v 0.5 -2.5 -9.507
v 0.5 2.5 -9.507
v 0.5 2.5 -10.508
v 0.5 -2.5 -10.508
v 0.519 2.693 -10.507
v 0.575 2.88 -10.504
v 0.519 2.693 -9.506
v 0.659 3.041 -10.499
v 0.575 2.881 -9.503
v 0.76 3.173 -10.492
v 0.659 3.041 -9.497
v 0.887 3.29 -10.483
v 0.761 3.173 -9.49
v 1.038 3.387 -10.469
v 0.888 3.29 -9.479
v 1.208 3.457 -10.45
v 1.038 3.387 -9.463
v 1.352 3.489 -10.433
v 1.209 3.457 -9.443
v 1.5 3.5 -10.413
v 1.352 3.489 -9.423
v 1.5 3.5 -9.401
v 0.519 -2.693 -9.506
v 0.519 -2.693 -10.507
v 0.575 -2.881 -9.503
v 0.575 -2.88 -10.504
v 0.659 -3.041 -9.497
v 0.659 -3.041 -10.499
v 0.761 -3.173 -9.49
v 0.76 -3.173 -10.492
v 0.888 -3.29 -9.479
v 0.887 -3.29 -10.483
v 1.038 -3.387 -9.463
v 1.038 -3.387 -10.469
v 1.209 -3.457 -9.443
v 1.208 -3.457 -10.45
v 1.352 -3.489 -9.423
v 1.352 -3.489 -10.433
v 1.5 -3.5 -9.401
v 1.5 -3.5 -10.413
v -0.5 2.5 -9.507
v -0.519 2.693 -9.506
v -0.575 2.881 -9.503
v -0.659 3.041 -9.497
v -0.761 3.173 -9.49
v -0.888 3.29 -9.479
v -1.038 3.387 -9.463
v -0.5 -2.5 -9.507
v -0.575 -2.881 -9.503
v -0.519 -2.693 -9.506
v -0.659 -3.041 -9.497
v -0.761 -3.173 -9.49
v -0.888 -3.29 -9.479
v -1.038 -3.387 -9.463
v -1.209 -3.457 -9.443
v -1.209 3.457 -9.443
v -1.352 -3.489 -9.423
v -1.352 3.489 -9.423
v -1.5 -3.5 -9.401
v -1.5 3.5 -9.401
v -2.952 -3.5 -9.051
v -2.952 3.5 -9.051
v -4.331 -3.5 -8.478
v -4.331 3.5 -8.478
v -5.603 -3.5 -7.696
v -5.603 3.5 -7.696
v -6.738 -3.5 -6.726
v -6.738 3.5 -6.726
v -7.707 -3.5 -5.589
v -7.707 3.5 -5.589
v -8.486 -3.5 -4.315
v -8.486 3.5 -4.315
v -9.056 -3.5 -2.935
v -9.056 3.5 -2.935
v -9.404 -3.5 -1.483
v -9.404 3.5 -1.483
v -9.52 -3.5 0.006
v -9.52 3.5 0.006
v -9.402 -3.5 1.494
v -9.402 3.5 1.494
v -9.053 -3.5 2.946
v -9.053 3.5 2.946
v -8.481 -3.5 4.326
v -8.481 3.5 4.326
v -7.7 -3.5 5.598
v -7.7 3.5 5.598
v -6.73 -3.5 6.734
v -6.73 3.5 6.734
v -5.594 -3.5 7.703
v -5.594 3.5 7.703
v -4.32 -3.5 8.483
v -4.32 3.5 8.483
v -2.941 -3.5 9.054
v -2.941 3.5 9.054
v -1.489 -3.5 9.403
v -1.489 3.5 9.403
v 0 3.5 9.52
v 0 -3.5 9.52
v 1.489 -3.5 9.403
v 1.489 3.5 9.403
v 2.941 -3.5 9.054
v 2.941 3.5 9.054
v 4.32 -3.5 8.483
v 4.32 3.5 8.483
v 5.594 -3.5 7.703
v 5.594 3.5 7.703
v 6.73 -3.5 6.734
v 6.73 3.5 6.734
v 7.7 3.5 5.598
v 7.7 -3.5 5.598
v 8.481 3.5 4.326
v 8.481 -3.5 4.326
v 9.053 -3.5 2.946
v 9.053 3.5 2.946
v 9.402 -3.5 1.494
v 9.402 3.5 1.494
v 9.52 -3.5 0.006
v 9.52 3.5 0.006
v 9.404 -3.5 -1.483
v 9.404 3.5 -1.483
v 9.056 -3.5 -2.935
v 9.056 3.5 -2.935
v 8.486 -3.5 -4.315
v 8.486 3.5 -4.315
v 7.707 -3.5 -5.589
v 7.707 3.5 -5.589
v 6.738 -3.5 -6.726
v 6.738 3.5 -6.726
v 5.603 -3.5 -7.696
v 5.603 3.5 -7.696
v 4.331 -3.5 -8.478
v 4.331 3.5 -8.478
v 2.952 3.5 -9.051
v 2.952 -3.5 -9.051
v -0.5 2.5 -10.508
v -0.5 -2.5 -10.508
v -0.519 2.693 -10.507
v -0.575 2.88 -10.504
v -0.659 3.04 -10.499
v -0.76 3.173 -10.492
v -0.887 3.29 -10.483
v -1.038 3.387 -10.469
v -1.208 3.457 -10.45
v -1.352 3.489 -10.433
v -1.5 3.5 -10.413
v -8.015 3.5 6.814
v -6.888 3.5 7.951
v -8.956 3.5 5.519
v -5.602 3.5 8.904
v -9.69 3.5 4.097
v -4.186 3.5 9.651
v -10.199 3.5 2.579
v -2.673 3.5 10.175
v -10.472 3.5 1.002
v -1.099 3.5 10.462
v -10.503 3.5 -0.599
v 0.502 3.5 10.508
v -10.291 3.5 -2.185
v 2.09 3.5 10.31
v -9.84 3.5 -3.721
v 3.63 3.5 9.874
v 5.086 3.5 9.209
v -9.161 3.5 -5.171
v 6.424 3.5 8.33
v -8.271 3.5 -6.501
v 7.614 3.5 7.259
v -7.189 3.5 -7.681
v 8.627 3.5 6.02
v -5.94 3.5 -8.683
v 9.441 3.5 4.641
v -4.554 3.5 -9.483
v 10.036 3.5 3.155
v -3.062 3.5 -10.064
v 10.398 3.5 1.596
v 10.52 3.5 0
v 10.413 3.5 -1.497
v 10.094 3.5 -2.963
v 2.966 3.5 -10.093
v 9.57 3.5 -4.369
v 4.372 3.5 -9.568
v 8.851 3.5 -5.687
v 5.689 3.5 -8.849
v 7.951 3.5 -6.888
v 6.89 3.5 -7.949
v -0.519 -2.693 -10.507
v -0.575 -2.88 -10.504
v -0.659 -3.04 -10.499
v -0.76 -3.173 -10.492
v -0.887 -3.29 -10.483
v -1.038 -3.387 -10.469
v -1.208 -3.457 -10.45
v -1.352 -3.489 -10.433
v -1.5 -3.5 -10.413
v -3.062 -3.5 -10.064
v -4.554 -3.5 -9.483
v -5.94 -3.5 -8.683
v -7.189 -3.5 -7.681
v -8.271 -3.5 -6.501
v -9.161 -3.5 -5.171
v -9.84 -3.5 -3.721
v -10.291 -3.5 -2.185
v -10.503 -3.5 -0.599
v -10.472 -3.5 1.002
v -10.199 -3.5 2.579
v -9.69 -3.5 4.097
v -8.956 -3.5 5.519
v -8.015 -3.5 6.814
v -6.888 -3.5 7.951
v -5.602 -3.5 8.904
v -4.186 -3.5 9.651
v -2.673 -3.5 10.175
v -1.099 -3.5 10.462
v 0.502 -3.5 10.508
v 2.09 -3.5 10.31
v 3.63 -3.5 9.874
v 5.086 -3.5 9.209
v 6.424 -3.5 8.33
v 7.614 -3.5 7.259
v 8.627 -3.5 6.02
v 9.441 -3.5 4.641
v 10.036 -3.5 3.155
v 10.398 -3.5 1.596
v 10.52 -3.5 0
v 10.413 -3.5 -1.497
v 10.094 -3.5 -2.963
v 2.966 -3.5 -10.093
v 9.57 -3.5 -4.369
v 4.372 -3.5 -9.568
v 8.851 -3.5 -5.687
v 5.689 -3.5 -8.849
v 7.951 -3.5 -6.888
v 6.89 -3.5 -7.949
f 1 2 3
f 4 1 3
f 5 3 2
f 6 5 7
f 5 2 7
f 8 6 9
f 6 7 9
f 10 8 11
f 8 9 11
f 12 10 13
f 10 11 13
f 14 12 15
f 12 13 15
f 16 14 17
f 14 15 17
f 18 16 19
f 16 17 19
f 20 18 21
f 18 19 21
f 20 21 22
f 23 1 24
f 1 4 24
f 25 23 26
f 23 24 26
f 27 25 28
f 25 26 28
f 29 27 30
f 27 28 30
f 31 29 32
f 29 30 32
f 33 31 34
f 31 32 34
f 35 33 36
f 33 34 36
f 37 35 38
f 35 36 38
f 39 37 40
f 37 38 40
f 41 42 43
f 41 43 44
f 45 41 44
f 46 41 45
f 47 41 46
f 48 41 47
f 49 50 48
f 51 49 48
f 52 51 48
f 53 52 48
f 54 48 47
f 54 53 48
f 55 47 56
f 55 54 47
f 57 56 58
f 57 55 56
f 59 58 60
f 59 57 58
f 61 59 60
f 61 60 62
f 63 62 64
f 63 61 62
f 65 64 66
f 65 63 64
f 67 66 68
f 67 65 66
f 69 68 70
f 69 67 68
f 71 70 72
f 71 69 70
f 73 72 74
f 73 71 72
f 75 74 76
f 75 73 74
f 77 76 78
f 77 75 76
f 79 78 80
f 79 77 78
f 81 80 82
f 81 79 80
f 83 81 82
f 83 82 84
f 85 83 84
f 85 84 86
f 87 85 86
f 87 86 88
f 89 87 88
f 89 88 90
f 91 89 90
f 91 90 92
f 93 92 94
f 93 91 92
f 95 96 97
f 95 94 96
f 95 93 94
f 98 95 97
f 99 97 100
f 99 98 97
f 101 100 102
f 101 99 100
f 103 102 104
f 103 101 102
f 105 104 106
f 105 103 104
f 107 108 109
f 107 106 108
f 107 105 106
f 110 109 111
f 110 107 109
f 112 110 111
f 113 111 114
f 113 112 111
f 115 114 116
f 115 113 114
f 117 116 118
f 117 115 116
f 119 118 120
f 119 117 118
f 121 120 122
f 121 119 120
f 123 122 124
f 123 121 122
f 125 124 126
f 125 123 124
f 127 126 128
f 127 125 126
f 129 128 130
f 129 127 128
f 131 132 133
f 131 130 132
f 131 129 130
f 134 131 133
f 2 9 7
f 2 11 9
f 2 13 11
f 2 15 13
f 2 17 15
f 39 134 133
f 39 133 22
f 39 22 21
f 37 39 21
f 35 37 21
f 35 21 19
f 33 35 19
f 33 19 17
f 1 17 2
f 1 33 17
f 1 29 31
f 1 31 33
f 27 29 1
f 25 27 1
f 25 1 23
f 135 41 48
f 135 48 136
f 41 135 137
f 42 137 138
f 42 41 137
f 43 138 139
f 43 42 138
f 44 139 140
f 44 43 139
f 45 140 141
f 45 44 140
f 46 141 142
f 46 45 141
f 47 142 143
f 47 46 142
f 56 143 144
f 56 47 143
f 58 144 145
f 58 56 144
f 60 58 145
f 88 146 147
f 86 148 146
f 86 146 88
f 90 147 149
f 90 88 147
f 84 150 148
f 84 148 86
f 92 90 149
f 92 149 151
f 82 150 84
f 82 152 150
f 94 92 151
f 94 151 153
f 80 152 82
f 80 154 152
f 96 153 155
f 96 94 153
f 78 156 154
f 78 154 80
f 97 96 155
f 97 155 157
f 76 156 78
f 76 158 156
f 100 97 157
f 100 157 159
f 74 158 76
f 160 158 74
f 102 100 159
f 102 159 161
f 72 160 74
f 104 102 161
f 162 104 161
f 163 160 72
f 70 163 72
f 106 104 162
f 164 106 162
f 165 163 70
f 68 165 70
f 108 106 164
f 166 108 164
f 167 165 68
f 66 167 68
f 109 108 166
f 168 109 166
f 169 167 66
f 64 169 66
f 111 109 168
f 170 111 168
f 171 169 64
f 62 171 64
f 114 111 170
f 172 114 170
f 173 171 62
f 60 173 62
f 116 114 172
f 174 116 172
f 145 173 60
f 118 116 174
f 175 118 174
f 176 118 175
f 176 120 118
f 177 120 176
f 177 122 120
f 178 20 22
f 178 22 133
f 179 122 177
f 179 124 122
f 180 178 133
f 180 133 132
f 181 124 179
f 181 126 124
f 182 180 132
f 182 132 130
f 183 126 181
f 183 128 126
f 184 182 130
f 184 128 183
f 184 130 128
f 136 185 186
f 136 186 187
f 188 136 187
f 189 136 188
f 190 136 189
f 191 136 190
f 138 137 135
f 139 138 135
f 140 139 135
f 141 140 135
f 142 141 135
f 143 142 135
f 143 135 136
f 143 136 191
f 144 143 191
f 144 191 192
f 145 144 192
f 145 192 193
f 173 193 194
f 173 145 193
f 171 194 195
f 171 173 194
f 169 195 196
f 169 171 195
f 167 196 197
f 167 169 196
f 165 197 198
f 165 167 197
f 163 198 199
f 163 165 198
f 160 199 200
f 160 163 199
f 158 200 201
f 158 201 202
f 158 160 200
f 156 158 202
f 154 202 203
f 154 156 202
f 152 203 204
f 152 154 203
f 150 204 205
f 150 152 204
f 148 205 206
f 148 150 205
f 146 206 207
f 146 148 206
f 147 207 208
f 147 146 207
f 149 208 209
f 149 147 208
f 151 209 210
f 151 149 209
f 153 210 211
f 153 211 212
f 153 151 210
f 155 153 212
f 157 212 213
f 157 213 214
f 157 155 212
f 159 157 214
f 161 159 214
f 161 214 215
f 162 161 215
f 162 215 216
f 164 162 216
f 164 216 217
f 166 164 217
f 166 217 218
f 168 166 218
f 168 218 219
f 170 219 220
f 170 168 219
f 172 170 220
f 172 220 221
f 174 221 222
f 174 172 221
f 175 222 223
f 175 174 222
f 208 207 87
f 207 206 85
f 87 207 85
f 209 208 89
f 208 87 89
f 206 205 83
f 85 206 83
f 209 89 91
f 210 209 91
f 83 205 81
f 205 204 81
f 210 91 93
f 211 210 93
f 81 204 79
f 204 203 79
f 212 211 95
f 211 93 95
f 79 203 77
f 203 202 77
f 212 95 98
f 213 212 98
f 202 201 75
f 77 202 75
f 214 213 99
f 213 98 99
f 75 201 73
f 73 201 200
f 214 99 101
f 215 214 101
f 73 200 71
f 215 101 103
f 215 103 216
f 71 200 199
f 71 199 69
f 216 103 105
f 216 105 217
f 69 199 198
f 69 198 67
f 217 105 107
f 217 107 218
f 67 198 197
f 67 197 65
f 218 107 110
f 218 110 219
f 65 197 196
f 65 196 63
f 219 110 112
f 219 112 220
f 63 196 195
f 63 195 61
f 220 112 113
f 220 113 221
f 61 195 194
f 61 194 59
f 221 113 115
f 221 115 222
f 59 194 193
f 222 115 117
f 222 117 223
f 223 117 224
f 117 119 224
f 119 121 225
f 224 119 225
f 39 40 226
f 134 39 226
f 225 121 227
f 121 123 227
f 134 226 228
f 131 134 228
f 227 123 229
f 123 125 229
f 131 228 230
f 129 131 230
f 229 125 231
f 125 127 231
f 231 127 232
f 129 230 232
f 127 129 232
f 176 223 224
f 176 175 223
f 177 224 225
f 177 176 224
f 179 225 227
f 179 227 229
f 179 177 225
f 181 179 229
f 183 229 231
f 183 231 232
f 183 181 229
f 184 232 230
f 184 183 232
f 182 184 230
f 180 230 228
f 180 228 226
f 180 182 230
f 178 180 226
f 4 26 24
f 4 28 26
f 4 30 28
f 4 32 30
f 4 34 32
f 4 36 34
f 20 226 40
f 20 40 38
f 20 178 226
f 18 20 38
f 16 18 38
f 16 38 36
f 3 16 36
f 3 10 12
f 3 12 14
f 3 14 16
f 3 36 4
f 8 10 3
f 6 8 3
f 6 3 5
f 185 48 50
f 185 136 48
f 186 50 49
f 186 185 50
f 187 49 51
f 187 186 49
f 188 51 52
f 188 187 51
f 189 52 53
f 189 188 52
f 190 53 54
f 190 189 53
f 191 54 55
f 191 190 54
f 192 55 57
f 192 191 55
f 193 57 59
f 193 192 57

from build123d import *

# Parameters (mm, degrees)
SKETCH3_R               = 10.52
SKETCH3_R_2             = 9.52
EXTRUDE_THIN1_DEPTH     = 3.5
SKETCH4_W               = 1
SKETCH4_H               = 1000
CUT_EXTRUDE1_DEPTH      = 4.5
CUT_EXTRUDE1_DEPTH_BACK = 4.5
FILLET1_R               = 1


with BuildPart() as part:
    # Sketch3 → Extrude-Thin1 (new body, symmetric)
    with BuildSketch(Plane(origin=(0, 0, 0), x_dir=(1, 0, 0), z_dir=(0, 1, 0))):
        Circle(SKETCH3_R)
        Circle(SKETCH3_R_2, mode=Mode.SUBTRACT)
    extrude(amount=EXTRUDE_THIN1_DEPTH, both=True)

    # Sketch4 → Cut-Extrude1 (cut, two sides)
    with BuildSketch(Plane(origin=(0, 0, 0), x_dir=(1, 0, 0), z_dir=(0, 1, 0))) as cut_extrude1_sk:
        with Locations((0, 500)):
            Rectangle(SKETCH4_W, SKETCH4_H)
    extrude(amount=CUT_EXTRUDE1_DEPTH, mode=Mode.SUBTRACT)
    extrude(cut_extrude1_sk.sketch, amount=-CUT_EXTRUDE1_DEPTH_BACK, mode=Mode.SUBTRACT)

    # Fillet1
    fillet1_edges = [part.edges().sort_by_distance(p)[0] for p in [
        (0.5, -3.5, -10.007485917),
        (-0.5, -3.5, -10.007485917),
        (0.5, 3.5, -10.007485917),
        (-0.5, 3.5, -10.007485917),
    ]]
    fillet(fillet1_edges, radius=FILLET1_R)


solid = part.part
